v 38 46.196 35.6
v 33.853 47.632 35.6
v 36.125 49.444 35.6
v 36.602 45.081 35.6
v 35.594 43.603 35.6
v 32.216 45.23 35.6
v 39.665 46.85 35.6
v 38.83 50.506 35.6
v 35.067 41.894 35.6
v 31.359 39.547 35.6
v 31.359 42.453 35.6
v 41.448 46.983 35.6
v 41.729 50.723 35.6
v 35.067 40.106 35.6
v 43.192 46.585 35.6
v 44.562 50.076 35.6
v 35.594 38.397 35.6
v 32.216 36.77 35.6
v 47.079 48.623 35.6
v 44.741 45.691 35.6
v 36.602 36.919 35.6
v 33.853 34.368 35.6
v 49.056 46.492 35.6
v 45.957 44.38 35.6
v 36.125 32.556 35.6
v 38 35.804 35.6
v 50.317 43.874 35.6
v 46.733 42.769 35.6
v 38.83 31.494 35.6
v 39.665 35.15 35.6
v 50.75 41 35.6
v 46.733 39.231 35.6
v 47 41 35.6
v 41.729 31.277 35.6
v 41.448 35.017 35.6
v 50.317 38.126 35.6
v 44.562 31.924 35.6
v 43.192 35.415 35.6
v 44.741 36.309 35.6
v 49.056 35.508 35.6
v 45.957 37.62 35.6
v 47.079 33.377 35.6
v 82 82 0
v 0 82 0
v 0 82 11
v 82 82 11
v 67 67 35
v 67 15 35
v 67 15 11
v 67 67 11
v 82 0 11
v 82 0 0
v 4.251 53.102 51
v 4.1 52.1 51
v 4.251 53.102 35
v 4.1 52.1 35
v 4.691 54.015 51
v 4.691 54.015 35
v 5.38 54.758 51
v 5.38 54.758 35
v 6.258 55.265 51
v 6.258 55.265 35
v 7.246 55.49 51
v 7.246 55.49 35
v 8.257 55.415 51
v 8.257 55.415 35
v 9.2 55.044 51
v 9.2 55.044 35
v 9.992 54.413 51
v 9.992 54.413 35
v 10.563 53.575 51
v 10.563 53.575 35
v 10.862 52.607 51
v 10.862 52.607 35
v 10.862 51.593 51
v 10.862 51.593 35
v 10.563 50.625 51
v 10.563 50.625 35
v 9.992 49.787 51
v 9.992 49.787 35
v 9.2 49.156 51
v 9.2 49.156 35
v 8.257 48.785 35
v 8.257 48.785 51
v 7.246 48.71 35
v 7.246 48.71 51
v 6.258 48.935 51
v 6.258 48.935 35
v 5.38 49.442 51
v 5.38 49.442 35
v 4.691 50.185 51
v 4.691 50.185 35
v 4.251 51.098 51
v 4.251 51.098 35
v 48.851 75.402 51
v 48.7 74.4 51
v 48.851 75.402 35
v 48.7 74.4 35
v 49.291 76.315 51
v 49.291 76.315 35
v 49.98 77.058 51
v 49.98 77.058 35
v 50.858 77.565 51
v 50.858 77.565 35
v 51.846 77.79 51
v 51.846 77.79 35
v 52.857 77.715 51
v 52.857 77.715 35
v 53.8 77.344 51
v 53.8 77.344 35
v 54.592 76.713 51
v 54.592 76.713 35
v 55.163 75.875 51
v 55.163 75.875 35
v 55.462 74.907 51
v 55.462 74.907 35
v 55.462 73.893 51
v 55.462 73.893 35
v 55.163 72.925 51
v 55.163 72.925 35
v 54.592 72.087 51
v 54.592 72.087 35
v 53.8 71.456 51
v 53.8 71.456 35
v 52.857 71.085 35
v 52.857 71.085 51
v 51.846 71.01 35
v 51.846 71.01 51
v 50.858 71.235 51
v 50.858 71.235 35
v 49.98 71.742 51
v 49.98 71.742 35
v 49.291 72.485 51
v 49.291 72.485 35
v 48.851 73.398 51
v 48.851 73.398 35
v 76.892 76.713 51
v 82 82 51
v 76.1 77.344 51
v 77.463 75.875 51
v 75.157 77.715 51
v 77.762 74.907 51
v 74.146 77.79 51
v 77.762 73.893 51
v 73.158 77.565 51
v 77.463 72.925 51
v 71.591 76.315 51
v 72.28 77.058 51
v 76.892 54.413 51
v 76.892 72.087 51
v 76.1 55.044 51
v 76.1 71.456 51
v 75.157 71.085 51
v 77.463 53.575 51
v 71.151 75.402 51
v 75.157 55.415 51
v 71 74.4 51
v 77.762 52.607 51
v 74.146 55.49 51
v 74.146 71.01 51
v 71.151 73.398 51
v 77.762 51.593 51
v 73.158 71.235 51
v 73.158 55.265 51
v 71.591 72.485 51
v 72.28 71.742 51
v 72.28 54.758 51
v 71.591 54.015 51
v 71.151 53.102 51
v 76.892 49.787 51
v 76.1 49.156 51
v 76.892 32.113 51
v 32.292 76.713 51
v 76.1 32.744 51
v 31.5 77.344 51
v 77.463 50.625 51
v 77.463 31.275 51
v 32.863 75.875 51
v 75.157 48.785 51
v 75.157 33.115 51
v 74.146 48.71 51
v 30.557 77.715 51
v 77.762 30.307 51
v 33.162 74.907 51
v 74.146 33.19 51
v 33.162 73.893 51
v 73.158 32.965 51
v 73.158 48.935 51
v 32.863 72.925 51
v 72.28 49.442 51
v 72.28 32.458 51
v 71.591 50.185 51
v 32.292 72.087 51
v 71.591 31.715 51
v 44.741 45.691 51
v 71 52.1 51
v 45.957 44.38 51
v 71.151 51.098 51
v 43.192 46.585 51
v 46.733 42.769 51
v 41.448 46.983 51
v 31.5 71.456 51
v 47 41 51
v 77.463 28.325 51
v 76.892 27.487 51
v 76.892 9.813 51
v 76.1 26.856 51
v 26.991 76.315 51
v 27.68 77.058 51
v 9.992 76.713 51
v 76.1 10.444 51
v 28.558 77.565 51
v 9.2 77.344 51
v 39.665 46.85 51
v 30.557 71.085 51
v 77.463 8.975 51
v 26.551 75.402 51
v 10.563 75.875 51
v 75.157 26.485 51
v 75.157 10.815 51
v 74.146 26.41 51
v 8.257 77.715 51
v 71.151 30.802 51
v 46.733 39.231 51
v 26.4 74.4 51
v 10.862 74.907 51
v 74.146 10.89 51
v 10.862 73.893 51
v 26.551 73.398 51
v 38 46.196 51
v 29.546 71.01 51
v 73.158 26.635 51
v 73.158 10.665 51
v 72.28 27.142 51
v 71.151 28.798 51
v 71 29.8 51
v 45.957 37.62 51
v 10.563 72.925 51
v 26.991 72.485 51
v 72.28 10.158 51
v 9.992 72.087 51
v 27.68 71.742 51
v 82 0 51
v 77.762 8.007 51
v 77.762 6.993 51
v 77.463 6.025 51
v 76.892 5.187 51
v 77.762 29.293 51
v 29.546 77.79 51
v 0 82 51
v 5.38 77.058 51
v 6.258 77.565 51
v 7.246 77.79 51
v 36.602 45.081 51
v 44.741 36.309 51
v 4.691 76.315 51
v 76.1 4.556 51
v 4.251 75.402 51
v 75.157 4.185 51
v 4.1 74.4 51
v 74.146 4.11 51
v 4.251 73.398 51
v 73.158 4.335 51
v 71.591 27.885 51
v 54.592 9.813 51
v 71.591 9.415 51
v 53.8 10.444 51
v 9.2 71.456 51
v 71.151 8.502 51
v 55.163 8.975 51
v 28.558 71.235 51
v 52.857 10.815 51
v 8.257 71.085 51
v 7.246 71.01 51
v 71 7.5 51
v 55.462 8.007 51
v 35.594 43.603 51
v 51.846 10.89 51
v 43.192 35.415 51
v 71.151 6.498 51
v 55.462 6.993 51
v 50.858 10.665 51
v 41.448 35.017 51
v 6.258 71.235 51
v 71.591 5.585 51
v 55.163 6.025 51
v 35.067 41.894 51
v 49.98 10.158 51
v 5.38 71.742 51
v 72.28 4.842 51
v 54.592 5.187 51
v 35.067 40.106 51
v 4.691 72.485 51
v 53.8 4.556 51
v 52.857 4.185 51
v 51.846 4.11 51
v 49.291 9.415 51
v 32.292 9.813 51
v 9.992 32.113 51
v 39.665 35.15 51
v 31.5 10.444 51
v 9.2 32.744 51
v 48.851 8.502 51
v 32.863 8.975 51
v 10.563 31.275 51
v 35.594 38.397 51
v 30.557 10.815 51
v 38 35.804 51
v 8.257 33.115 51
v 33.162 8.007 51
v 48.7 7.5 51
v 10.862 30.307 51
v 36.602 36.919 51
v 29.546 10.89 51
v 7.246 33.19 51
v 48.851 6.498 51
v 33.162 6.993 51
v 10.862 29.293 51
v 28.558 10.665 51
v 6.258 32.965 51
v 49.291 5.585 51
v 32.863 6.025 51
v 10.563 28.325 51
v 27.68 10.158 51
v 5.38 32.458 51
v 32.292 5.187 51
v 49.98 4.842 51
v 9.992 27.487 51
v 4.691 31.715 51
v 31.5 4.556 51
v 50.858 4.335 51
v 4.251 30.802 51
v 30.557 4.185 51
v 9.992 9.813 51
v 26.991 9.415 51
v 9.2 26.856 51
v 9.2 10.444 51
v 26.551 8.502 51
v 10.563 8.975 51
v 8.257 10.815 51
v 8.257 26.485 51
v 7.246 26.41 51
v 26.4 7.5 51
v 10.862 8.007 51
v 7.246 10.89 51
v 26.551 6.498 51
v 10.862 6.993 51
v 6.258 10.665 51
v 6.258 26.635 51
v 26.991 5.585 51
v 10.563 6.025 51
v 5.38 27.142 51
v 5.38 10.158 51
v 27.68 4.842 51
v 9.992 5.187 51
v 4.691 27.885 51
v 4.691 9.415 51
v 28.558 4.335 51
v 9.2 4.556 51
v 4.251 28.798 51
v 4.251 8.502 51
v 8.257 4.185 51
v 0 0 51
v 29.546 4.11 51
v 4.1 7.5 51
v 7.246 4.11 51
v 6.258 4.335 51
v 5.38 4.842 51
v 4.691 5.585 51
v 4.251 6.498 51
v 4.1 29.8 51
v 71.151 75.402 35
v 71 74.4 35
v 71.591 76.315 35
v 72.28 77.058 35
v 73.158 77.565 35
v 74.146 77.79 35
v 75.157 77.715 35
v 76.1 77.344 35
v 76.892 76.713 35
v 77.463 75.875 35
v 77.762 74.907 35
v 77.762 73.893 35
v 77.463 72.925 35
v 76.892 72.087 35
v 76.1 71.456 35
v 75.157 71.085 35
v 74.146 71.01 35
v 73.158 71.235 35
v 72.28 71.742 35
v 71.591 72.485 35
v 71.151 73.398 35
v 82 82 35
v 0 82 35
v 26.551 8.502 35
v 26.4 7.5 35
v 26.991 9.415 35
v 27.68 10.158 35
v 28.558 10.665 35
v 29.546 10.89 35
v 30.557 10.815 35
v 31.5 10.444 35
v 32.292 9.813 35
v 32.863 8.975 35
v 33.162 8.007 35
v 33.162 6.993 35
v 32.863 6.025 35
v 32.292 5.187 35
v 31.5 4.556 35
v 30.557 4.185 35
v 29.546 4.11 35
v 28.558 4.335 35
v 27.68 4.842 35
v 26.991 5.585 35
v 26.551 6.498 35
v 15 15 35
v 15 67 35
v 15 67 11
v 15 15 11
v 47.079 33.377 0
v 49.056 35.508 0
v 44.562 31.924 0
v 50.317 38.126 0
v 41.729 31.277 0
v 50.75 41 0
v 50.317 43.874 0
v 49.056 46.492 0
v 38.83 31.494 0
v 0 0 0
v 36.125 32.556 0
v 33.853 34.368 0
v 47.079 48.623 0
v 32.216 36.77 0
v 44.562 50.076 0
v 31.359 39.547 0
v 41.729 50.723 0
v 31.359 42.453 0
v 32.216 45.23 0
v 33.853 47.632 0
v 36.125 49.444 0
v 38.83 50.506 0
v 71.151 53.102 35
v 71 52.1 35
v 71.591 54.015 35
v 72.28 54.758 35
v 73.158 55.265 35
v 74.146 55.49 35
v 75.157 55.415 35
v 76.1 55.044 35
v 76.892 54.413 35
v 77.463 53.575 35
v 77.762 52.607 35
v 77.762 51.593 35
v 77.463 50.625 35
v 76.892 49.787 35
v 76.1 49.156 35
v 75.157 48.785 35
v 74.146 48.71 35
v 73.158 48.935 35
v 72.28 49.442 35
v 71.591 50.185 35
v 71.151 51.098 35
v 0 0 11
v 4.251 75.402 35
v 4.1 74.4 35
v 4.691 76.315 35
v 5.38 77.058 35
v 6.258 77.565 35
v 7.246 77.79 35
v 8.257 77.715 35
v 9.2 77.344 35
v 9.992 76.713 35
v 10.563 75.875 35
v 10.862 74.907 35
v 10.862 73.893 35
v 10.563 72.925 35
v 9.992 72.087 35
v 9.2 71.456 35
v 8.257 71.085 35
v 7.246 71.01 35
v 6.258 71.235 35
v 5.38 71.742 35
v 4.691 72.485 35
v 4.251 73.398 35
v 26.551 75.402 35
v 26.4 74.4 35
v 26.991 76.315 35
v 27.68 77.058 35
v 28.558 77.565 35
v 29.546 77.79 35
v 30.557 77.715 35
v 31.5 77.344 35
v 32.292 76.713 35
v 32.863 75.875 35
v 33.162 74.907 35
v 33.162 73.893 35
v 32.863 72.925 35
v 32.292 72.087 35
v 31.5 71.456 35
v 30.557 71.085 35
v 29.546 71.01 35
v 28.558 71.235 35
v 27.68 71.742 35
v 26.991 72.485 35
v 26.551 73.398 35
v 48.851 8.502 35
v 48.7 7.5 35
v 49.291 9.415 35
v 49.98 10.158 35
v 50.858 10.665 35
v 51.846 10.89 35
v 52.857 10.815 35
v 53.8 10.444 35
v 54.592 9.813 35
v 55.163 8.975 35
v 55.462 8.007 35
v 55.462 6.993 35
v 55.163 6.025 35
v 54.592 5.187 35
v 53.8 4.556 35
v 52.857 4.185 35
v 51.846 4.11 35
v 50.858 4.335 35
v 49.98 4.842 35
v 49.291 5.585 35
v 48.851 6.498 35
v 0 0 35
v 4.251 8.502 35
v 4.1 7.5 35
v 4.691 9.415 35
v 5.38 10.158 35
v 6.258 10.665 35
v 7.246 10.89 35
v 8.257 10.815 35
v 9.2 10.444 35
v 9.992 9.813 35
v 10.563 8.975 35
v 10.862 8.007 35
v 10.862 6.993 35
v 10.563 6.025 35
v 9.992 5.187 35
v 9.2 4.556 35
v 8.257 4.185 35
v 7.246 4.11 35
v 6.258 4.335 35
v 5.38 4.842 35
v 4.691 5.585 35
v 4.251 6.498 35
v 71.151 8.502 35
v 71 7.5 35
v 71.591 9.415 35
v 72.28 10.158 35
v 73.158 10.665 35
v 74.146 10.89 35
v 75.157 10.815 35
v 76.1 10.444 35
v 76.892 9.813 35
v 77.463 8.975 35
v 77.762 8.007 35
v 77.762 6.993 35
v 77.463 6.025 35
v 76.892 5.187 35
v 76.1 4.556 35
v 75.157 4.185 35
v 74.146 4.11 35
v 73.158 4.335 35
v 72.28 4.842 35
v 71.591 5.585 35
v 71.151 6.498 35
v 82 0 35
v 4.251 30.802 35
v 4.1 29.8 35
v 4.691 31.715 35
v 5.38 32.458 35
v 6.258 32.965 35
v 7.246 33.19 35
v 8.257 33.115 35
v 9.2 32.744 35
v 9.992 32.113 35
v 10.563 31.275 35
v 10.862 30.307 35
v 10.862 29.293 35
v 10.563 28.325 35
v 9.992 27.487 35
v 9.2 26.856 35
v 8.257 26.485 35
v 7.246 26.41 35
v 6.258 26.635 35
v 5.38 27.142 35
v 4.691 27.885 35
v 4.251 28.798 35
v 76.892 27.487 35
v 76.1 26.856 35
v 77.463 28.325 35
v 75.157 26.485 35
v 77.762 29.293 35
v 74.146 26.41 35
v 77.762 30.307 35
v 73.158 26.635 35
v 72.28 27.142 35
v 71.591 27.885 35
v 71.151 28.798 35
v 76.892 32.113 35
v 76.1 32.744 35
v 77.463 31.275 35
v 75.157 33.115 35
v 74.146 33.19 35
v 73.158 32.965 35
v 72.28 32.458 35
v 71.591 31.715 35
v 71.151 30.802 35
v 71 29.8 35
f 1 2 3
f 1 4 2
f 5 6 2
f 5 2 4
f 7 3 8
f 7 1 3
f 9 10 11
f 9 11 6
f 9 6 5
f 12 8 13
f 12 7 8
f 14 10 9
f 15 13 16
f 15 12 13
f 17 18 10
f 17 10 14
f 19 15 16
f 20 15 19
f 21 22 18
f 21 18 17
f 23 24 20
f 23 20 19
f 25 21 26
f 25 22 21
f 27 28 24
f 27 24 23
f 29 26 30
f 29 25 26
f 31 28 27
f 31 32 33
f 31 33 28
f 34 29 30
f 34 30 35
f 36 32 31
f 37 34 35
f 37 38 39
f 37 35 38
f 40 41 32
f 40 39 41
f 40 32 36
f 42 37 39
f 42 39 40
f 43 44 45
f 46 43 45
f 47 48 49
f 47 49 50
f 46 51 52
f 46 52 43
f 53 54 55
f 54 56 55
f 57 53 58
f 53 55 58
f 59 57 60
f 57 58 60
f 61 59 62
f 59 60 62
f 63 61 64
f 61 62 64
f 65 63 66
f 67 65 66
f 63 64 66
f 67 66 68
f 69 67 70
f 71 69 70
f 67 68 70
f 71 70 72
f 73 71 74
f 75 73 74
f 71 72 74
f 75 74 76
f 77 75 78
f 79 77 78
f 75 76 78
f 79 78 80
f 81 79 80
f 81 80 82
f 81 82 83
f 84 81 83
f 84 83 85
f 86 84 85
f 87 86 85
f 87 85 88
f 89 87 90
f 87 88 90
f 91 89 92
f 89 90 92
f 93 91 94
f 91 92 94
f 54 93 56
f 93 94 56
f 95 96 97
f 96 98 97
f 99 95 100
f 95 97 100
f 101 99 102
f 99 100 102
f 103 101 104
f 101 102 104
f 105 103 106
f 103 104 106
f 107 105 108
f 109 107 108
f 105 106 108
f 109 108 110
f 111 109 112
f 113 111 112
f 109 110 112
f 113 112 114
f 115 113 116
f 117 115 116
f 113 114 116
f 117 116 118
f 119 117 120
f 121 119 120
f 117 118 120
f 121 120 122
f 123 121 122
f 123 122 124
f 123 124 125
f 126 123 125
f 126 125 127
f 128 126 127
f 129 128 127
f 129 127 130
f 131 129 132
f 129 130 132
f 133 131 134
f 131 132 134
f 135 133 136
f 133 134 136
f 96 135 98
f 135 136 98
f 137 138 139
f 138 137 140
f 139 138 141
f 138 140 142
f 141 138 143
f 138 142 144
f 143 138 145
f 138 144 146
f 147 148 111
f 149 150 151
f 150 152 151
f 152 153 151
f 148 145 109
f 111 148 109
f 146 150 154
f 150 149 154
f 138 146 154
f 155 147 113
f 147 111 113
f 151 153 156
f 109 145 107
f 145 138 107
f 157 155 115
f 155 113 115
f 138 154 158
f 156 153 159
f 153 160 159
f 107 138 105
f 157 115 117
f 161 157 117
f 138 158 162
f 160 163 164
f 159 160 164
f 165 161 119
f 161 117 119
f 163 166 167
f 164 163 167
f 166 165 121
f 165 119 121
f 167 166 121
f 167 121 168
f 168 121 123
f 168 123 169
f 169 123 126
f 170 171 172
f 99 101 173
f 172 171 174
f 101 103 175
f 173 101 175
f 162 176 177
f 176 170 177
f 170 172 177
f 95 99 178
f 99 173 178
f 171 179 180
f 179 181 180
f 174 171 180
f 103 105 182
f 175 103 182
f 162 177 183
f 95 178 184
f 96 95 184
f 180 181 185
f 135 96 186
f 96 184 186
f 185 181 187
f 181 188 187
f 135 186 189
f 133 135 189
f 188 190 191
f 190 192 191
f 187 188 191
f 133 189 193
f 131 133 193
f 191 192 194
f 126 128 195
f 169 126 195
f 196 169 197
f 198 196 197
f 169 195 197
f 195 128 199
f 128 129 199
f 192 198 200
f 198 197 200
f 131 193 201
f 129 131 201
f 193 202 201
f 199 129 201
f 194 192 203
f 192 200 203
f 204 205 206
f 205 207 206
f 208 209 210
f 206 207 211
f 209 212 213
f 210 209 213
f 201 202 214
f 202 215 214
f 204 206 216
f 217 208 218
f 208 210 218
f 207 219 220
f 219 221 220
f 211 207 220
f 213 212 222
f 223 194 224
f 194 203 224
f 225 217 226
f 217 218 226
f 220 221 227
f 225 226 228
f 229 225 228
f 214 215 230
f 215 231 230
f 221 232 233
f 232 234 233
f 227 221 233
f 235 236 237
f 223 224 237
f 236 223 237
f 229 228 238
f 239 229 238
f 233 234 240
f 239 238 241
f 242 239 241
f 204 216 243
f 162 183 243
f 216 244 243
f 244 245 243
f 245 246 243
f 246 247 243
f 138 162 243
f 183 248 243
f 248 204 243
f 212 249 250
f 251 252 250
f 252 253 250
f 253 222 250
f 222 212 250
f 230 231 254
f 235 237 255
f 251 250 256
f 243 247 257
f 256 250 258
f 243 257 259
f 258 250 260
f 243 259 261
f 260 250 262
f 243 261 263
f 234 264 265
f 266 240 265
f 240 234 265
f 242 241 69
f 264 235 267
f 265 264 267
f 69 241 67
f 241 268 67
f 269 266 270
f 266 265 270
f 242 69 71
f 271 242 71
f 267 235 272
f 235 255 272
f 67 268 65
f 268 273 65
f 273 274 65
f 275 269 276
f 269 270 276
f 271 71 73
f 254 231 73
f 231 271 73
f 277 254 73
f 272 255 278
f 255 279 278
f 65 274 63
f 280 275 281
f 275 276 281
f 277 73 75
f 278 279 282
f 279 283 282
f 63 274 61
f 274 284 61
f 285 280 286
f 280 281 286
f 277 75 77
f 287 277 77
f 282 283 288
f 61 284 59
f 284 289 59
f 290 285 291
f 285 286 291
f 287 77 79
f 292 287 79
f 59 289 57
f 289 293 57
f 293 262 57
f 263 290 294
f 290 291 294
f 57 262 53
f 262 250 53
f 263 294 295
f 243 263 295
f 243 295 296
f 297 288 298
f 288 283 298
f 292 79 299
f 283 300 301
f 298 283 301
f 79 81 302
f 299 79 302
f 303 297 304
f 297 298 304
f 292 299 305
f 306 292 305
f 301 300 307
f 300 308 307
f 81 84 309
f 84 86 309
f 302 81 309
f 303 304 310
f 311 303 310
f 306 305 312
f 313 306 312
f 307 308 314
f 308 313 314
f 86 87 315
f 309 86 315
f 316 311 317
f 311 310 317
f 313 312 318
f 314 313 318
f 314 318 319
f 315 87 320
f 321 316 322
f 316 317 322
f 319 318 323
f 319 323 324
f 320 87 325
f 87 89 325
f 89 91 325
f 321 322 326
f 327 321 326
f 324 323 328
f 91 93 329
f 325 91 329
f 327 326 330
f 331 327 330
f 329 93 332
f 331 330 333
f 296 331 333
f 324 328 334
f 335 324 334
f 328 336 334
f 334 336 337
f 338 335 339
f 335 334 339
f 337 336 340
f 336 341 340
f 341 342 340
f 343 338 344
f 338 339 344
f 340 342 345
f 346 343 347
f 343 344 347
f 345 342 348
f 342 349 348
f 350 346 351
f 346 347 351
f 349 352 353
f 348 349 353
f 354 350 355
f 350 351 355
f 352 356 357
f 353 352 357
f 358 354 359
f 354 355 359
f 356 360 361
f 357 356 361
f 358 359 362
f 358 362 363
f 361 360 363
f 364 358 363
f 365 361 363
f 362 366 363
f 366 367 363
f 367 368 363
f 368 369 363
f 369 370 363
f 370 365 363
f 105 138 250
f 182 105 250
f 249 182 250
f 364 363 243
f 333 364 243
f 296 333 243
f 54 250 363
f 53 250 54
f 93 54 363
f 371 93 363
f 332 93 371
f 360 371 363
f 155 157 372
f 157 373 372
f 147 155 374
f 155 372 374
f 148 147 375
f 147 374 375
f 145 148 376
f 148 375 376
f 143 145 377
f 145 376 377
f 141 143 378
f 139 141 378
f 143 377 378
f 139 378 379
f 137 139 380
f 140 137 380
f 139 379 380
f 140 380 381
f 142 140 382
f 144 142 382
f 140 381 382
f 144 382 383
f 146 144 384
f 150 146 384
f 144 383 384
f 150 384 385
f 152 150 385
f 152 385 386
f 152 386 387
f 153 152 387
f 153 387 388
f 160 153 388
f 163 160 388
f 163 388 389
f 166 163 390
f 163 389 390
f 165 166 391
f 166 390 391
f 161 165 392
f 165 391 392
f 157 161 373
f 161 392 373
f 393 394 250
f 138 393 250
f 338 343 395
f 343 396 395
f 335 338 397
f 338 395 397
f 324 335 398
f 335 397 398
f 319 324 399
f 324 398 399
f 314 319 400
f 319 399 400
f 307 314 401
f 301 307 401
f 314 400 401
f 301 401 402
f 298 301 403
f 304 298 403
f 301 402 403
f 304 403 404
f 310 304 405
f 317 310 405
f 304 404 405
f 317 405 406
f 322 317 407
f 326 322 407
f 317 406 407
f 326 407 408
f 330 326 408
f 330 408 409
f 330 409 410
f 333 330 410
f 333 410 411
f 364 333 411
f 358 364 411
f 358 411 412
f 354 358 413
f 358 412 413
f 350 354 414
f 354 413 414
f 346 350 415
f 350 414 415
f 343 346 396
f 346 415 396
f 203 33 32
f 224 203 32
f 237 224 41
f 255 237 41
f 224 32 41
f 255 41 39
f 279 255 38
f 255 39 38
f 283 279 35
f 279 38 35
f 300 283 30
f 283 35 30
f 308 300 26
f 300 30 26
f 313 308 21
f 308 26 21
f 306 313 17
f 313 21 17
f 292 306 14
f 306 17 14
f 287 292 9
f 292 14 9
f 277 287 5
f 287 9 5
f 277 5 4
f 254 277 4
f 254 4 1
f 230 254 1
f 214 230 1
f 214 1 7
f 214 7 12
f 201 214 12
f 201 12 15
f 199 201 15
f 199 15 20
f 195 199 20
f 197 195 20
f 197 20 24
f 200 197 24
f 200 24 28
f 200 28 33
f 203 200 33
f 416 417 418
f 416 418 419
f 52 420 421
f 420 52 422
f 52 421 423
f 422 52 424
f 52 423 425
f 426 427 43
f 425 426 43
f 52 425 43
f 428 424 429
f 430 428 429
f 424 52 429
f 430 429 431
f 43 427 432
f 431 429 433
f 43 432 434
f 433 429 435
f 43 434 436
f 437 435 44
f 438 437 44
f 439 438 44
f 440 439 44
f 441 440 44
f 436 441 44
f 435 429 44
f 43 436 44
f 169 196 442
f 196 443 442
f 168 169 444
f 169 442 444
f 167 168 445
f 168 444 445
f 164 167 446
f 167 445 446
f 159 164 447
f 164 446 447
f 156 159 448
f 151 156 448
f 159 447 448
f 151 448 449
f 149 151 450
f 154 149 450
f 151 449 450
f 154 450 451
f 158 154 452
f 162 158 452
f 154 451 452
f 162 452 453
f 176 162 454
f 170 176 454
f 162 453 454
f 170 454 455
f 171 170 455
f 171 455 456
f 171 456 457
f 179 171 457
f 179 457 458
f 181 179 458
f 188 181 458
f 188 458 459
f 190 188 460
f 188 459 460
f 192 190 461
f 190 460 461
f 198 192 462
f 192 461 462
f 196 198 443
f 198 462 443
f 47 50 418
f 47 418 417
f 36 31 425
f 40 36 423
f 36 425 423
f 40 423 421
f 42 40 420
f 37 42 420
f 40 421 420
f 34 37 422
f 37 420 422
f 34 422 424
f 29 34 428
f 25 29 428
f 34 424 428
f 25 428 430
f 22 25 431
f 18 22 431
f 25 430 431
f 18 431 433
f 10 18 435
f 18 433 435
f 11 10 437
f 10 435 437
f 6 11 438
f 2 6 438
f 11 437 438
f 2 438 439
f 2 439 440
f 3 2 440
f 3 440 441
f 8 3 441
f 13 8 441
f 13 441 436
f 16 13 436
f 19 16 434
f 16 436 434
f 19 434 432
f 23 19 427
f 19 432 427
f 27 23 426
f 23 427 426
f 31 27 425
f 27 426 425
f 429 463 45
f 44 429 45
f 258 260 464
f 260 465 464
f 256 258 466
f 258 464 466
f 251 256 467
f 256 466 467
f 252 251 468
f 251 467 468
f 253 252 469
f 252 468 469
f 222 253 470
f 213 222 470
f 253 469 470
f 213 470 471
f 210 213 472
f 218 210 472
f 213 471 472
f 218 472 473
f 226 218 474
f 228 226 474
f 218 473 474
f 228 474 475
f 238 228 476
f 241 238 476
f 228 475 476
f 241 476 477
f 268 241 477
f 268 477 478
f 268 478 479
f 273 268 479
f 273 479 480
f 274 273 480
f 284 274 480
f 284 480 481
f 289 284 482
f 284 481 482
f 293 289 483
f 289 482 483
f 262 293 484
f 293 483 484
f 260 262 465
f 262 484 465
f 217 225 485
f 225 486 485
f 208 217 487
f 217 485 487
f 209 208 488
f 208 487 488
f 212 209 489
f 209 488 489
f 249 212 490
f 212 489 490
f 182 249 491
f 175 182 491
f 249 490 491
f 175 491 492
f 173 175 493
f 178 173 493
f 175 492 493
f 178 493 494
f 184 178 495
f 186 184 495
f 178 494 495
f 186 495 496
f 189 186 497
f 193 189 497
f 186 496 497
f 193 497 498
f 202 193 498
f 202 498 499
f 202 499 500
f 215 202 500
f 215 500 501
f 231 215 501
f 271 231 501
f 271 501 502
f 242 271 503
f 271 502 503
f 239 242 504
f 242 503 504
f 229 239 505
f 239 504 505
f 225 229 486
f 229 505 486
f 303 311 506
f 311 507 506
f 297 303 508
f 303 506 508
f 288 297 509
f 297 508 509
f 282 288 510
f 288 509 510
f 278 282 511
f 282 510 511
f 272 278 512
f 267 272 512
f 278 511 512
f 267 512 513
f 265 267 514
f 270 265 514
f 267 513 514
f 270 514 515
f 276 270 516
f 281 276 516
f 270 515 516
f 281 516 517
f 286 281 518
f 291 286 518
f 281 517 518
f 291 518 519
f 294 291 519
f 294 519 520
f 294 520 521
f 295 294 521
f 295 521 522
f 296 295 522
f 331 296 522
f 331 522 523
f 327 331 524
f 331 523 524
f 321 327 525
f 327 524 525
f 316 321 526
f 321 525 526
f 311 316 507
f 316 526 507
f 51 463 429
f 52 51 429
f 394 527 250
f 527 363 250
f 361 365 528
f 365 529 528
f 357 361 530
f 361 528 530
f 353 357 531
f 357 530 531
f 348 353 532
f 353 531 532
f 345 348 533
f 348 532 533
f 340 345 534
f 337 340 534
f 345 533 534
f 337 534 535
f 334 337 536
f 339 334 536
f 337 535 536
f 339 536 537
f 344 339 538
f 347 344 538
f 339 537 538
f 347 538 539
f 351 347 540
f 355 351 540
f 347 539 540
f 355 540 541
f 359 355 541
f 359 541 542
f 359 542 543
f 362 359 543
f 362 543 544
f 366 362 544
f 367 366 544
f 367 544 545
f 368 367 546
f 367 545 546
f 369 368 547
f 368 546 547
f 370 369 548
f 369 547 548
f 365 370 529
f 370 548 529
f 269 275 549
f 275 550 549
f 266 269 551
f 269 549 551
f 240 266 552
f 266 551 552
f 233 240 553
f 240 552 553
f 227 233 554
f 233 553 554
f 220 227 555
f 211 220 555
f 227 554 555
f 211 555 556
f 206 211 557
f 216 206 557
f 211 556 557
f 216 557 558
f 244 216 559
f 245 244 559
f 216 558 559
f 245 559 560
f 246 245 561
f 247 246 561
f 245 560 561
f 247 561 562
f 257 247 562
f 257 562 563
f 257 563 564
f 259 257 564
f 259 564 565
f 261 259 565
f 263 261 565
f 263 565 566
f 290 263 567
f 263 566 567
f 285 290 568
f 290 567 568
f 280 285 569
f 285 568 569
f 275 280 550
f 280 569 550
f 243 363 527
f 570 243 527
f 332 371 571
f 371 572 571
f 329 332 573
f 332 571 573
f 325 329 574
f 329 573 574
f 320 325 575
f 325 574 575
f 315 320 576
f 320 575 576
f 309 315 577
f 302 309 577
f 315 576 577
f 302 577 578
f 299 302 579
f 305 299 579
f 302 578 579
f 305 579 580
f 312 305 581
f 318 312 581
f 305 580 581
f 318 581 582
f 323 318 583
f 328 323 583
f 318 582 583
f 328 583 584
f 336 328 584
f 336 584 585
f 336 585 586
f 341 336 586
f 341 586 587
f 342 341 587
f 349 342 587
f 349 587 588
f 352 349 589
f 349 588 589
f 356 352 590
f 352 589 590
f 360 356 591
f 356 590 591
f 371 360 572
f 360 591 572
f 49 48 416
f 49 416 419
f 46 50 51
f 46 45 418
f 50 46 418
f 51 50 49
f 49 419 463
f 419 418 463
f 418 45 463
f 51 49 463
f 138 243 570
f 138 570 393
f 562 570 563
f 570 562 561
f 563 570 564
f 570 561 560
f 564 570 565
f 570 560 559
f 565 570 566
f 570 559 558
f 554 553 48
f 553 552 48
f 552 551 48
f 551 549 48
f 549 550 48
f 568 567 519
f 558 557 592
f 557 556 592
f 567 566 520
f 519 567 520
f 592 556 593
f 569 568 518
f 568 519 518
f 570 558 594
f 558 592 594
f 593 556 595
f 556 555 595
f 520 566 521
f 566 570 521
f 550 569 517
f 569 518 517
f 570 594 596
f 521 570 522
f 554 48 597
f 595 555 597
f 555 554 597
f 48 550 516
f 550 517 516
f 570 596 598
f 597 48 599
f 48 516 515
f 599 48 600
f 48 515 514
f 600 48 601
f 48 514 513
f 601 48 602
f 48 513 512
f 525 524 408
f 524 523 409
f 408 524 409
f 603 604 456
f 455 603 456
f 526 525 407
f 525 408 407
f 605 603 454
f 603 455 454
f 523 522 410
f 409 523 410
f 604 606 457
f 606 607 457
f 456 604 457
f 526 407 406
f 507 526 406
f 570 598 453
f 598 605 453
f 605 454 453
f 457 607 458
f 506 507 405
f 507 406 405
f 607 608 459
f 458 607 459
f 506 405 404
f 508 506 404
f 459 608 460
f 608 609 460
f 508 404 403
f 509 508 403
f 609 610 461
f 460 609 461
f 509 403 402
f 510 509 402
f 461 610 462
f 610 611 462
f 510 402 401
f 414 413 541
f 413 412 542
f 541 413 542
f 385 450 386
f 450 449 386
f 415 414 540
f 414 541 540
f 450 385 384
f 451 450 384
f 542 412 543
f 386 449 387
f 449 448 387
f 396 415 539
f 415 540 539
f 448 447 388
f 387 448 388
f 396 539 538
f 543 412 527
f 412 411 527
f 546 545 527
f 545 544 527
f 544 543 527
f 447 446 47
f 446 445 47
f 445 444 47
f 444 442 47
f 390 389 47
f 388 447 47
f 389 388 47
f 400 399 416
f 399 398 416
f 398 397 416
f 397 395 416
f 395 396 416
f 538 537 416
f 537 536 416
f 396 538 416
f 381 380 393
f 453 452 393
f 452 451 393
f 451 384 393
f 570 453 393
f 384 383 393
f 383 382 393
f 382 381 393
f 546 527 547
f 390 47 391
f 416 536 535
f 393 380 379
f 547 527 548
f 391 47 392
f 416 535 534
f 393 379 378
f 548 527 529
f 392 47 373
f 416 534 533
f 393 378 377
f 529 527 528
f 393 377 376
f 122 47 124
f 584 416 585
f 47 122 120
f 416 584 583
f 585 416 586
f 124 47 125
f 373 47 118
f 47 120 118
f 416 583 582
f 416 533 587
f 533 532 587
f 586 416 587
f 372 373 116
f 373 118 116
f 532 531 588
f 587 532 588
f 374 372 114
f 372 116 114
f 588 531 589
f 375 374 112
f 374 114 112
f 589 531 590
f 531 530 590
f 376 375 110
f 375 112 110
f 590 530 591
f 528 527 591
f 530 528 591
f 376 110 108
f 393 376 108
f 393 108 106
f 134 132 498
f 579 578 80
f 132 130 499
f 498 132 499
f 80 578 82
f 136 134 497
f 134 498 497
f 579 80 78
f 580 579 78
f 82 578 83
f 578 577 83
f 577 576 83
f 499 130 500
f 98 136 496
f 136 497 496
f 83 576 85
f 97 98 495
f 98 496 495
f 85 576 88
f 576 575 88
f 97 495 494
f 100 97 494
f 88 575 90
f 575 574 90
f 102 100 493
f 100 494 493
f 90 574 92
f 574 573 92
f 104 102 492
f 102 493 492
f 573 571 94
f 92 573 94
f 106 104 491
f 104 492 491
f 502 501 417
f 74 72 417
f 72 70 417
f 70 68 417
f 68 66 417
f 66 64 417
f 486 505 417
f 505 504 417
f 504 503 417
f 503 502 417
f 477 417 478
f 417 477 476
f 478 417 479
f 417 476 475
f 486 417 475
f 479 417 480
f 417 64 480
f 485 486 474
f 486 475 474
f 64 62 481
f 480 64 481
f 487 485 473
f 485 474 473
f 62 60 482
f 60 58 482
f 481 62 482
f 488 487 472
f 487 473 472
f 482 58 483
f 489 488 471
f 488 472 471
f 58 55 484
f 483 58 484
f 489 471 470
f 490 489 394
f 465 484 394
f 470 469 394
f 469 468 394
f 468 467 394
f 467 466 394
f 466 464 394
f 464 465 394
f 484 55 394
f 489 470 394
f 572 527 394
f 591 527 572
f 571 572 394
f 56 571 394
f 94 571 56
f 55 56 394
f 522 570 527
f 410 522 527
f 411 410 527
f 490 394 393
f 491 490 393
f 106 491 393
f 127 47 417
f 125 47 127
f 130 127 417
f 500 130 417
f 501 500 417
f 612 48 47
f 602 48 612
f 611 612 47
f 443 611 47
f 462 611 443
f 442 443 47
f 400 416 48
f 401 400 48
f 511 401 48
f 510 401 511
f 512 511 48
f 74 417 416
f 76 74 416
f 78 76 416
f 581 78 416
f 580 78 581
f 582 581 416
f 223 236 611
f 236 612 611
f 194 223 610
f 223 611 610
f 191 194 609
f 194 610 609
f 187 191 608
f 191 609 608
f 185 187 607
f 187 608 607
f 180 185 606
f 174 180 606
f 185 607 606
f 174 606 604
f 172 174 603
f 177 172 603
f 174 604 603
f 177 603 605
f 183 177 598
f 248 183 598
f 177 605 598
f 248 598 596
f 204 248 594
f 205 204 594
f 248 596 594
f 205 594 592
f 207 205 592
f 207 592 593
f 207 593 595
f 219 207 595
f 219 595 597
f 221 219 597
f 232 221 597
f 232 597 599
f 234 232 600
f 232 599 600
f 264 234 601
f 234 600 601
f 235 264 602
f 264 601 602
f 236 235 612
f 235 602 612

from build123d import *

# Parameters (mm, degrees)
F1_DEPTH  = 82
F2_W      = 52
F2_H      = 24
F3_DEPTH  = 15
F4_W      = 52
F4_H      = 24
F5_DEPTH  = 15
F6_R      = 9.75
F7_DEPTH  = 35.6
F8_R      = 6
F9_DEPTH  = 15.401
F10_R     = 3.25
F11_DEPTH = 20
F12_D     = 6.8
F12_DEPTH = 16
F12_TIP   = 2.0429261047


with BuildPart() as f1:
    # F0 (on Right) → F1 (new body)
    with BuildSketch(Plane.YZ):
        Polygon((0, 11), (0, 0), (82, 0), (82, 11), (67, 11), (67, 35), (82, 35), (82, 51), (0, 51), (0, 35), (15, 35), (15, 11), align=None)
    extrude(amount=F1_DEPTH)

    # F2 (on face) → F3 (cut)
    with BuildSketch(Plane.YZ.offset(82)):
        with Locations((41, 23)):
            Rectangle(F2_W, F2_H)
    extrude(amount=-F3_DEPTH, mode=Mode.SUBTRACT)

    # F4 (on face) → F5 (cut)
    with BuildSketch(Plane(origin=(0, 0, 0), x_dir=(0, -1, 0), z_dir=(-1, 0, 0))):
        with Locations((-41, 23)):
            Rectangle(F4_W, F4_H)
    extrude(amount=-F5_DEPTH, mode=Mode.SUBTRACT)

    # F6 (on face) → F7 (cut)
    with BuildSketch(Plane(origin=(0, 0, 0), x_dir=(1, 0, 0), z_dir=(0, 0, -1))):
        with Locations((41, -41)):
            Circle(F6_R)
    extrude(amount=-F7_DEPTH, mode=Mode.SUBTRACT)

    # F8 (on face) → F9 (cut, through all)
    with BuildSketch(Plane(origin=(0, 0, 35.6), x_dir=(1, 0, 0), z_dir=(0, 0, -1))):
        with Locations((41, -41)):
            Circle(F8_R)
    extrude(amount=-F9_DEPTH, mode=Mode.SUBTRACT)

    # F10 (on face) → F11 (cut)
    with BuildSketch(Plane.XY.offset(51)):
        with Locations((7.5, 7.5)):
            Circle(F10_R)
        with Locations((7.5, 29.8)):
            Circle(F10_R)
        with Locations((7.5, 52.1)):
            Circle(F10_R)
        with Locations((7.5, 74.4)):
            Circle(F10_R)
        with Locations((29.8, 7.5)):
            Circle(F10_R)
        with Locations((29.8, 74.4)):
            Circle(F10_R)
        with Locations((52.1, 7.5)):
            Circle(F10_R)
        with Locations((52.1, 74.4)):
            Circle(F10_R)
        with Locations((74.4, 7.5)):
            Circle(F10_R)
        with Locations((74.4, 29.8)):
            Circle(F10_R)
        with Locations((74.4, 52.1)):
            Circle(F10_R)
        with Locations((74.4, 74.4)):
            Circle(F10_R)
    extrude(amount=-F11_DEPTH, mode=Mode.SUBTRACT)

    # F12
    with Locations(Plane.XY.offset(51)):
        with Locations((7.5, 7.5), (7.5, 29.8), (7.5, 52.1), (7.5, 74.4), (29.8, 74.4), (52.1, 74.4), (74.4, 74.4), (74.4, 52.1), (74.4, 29.8), (74.4, 7.5), (52.1, 7.5), (29.8, 7.5)):
            Hole(F12_D / 2, depth=F12_DEPTH)
            with Locations((0, 0, -(F12_DEPTH + F12_TIP / 2))):  # 118° drill point
                Cone(0, F12_D / 2, F12_TIP, mode=Mode.SUBTRACT)


solid = f1.part
